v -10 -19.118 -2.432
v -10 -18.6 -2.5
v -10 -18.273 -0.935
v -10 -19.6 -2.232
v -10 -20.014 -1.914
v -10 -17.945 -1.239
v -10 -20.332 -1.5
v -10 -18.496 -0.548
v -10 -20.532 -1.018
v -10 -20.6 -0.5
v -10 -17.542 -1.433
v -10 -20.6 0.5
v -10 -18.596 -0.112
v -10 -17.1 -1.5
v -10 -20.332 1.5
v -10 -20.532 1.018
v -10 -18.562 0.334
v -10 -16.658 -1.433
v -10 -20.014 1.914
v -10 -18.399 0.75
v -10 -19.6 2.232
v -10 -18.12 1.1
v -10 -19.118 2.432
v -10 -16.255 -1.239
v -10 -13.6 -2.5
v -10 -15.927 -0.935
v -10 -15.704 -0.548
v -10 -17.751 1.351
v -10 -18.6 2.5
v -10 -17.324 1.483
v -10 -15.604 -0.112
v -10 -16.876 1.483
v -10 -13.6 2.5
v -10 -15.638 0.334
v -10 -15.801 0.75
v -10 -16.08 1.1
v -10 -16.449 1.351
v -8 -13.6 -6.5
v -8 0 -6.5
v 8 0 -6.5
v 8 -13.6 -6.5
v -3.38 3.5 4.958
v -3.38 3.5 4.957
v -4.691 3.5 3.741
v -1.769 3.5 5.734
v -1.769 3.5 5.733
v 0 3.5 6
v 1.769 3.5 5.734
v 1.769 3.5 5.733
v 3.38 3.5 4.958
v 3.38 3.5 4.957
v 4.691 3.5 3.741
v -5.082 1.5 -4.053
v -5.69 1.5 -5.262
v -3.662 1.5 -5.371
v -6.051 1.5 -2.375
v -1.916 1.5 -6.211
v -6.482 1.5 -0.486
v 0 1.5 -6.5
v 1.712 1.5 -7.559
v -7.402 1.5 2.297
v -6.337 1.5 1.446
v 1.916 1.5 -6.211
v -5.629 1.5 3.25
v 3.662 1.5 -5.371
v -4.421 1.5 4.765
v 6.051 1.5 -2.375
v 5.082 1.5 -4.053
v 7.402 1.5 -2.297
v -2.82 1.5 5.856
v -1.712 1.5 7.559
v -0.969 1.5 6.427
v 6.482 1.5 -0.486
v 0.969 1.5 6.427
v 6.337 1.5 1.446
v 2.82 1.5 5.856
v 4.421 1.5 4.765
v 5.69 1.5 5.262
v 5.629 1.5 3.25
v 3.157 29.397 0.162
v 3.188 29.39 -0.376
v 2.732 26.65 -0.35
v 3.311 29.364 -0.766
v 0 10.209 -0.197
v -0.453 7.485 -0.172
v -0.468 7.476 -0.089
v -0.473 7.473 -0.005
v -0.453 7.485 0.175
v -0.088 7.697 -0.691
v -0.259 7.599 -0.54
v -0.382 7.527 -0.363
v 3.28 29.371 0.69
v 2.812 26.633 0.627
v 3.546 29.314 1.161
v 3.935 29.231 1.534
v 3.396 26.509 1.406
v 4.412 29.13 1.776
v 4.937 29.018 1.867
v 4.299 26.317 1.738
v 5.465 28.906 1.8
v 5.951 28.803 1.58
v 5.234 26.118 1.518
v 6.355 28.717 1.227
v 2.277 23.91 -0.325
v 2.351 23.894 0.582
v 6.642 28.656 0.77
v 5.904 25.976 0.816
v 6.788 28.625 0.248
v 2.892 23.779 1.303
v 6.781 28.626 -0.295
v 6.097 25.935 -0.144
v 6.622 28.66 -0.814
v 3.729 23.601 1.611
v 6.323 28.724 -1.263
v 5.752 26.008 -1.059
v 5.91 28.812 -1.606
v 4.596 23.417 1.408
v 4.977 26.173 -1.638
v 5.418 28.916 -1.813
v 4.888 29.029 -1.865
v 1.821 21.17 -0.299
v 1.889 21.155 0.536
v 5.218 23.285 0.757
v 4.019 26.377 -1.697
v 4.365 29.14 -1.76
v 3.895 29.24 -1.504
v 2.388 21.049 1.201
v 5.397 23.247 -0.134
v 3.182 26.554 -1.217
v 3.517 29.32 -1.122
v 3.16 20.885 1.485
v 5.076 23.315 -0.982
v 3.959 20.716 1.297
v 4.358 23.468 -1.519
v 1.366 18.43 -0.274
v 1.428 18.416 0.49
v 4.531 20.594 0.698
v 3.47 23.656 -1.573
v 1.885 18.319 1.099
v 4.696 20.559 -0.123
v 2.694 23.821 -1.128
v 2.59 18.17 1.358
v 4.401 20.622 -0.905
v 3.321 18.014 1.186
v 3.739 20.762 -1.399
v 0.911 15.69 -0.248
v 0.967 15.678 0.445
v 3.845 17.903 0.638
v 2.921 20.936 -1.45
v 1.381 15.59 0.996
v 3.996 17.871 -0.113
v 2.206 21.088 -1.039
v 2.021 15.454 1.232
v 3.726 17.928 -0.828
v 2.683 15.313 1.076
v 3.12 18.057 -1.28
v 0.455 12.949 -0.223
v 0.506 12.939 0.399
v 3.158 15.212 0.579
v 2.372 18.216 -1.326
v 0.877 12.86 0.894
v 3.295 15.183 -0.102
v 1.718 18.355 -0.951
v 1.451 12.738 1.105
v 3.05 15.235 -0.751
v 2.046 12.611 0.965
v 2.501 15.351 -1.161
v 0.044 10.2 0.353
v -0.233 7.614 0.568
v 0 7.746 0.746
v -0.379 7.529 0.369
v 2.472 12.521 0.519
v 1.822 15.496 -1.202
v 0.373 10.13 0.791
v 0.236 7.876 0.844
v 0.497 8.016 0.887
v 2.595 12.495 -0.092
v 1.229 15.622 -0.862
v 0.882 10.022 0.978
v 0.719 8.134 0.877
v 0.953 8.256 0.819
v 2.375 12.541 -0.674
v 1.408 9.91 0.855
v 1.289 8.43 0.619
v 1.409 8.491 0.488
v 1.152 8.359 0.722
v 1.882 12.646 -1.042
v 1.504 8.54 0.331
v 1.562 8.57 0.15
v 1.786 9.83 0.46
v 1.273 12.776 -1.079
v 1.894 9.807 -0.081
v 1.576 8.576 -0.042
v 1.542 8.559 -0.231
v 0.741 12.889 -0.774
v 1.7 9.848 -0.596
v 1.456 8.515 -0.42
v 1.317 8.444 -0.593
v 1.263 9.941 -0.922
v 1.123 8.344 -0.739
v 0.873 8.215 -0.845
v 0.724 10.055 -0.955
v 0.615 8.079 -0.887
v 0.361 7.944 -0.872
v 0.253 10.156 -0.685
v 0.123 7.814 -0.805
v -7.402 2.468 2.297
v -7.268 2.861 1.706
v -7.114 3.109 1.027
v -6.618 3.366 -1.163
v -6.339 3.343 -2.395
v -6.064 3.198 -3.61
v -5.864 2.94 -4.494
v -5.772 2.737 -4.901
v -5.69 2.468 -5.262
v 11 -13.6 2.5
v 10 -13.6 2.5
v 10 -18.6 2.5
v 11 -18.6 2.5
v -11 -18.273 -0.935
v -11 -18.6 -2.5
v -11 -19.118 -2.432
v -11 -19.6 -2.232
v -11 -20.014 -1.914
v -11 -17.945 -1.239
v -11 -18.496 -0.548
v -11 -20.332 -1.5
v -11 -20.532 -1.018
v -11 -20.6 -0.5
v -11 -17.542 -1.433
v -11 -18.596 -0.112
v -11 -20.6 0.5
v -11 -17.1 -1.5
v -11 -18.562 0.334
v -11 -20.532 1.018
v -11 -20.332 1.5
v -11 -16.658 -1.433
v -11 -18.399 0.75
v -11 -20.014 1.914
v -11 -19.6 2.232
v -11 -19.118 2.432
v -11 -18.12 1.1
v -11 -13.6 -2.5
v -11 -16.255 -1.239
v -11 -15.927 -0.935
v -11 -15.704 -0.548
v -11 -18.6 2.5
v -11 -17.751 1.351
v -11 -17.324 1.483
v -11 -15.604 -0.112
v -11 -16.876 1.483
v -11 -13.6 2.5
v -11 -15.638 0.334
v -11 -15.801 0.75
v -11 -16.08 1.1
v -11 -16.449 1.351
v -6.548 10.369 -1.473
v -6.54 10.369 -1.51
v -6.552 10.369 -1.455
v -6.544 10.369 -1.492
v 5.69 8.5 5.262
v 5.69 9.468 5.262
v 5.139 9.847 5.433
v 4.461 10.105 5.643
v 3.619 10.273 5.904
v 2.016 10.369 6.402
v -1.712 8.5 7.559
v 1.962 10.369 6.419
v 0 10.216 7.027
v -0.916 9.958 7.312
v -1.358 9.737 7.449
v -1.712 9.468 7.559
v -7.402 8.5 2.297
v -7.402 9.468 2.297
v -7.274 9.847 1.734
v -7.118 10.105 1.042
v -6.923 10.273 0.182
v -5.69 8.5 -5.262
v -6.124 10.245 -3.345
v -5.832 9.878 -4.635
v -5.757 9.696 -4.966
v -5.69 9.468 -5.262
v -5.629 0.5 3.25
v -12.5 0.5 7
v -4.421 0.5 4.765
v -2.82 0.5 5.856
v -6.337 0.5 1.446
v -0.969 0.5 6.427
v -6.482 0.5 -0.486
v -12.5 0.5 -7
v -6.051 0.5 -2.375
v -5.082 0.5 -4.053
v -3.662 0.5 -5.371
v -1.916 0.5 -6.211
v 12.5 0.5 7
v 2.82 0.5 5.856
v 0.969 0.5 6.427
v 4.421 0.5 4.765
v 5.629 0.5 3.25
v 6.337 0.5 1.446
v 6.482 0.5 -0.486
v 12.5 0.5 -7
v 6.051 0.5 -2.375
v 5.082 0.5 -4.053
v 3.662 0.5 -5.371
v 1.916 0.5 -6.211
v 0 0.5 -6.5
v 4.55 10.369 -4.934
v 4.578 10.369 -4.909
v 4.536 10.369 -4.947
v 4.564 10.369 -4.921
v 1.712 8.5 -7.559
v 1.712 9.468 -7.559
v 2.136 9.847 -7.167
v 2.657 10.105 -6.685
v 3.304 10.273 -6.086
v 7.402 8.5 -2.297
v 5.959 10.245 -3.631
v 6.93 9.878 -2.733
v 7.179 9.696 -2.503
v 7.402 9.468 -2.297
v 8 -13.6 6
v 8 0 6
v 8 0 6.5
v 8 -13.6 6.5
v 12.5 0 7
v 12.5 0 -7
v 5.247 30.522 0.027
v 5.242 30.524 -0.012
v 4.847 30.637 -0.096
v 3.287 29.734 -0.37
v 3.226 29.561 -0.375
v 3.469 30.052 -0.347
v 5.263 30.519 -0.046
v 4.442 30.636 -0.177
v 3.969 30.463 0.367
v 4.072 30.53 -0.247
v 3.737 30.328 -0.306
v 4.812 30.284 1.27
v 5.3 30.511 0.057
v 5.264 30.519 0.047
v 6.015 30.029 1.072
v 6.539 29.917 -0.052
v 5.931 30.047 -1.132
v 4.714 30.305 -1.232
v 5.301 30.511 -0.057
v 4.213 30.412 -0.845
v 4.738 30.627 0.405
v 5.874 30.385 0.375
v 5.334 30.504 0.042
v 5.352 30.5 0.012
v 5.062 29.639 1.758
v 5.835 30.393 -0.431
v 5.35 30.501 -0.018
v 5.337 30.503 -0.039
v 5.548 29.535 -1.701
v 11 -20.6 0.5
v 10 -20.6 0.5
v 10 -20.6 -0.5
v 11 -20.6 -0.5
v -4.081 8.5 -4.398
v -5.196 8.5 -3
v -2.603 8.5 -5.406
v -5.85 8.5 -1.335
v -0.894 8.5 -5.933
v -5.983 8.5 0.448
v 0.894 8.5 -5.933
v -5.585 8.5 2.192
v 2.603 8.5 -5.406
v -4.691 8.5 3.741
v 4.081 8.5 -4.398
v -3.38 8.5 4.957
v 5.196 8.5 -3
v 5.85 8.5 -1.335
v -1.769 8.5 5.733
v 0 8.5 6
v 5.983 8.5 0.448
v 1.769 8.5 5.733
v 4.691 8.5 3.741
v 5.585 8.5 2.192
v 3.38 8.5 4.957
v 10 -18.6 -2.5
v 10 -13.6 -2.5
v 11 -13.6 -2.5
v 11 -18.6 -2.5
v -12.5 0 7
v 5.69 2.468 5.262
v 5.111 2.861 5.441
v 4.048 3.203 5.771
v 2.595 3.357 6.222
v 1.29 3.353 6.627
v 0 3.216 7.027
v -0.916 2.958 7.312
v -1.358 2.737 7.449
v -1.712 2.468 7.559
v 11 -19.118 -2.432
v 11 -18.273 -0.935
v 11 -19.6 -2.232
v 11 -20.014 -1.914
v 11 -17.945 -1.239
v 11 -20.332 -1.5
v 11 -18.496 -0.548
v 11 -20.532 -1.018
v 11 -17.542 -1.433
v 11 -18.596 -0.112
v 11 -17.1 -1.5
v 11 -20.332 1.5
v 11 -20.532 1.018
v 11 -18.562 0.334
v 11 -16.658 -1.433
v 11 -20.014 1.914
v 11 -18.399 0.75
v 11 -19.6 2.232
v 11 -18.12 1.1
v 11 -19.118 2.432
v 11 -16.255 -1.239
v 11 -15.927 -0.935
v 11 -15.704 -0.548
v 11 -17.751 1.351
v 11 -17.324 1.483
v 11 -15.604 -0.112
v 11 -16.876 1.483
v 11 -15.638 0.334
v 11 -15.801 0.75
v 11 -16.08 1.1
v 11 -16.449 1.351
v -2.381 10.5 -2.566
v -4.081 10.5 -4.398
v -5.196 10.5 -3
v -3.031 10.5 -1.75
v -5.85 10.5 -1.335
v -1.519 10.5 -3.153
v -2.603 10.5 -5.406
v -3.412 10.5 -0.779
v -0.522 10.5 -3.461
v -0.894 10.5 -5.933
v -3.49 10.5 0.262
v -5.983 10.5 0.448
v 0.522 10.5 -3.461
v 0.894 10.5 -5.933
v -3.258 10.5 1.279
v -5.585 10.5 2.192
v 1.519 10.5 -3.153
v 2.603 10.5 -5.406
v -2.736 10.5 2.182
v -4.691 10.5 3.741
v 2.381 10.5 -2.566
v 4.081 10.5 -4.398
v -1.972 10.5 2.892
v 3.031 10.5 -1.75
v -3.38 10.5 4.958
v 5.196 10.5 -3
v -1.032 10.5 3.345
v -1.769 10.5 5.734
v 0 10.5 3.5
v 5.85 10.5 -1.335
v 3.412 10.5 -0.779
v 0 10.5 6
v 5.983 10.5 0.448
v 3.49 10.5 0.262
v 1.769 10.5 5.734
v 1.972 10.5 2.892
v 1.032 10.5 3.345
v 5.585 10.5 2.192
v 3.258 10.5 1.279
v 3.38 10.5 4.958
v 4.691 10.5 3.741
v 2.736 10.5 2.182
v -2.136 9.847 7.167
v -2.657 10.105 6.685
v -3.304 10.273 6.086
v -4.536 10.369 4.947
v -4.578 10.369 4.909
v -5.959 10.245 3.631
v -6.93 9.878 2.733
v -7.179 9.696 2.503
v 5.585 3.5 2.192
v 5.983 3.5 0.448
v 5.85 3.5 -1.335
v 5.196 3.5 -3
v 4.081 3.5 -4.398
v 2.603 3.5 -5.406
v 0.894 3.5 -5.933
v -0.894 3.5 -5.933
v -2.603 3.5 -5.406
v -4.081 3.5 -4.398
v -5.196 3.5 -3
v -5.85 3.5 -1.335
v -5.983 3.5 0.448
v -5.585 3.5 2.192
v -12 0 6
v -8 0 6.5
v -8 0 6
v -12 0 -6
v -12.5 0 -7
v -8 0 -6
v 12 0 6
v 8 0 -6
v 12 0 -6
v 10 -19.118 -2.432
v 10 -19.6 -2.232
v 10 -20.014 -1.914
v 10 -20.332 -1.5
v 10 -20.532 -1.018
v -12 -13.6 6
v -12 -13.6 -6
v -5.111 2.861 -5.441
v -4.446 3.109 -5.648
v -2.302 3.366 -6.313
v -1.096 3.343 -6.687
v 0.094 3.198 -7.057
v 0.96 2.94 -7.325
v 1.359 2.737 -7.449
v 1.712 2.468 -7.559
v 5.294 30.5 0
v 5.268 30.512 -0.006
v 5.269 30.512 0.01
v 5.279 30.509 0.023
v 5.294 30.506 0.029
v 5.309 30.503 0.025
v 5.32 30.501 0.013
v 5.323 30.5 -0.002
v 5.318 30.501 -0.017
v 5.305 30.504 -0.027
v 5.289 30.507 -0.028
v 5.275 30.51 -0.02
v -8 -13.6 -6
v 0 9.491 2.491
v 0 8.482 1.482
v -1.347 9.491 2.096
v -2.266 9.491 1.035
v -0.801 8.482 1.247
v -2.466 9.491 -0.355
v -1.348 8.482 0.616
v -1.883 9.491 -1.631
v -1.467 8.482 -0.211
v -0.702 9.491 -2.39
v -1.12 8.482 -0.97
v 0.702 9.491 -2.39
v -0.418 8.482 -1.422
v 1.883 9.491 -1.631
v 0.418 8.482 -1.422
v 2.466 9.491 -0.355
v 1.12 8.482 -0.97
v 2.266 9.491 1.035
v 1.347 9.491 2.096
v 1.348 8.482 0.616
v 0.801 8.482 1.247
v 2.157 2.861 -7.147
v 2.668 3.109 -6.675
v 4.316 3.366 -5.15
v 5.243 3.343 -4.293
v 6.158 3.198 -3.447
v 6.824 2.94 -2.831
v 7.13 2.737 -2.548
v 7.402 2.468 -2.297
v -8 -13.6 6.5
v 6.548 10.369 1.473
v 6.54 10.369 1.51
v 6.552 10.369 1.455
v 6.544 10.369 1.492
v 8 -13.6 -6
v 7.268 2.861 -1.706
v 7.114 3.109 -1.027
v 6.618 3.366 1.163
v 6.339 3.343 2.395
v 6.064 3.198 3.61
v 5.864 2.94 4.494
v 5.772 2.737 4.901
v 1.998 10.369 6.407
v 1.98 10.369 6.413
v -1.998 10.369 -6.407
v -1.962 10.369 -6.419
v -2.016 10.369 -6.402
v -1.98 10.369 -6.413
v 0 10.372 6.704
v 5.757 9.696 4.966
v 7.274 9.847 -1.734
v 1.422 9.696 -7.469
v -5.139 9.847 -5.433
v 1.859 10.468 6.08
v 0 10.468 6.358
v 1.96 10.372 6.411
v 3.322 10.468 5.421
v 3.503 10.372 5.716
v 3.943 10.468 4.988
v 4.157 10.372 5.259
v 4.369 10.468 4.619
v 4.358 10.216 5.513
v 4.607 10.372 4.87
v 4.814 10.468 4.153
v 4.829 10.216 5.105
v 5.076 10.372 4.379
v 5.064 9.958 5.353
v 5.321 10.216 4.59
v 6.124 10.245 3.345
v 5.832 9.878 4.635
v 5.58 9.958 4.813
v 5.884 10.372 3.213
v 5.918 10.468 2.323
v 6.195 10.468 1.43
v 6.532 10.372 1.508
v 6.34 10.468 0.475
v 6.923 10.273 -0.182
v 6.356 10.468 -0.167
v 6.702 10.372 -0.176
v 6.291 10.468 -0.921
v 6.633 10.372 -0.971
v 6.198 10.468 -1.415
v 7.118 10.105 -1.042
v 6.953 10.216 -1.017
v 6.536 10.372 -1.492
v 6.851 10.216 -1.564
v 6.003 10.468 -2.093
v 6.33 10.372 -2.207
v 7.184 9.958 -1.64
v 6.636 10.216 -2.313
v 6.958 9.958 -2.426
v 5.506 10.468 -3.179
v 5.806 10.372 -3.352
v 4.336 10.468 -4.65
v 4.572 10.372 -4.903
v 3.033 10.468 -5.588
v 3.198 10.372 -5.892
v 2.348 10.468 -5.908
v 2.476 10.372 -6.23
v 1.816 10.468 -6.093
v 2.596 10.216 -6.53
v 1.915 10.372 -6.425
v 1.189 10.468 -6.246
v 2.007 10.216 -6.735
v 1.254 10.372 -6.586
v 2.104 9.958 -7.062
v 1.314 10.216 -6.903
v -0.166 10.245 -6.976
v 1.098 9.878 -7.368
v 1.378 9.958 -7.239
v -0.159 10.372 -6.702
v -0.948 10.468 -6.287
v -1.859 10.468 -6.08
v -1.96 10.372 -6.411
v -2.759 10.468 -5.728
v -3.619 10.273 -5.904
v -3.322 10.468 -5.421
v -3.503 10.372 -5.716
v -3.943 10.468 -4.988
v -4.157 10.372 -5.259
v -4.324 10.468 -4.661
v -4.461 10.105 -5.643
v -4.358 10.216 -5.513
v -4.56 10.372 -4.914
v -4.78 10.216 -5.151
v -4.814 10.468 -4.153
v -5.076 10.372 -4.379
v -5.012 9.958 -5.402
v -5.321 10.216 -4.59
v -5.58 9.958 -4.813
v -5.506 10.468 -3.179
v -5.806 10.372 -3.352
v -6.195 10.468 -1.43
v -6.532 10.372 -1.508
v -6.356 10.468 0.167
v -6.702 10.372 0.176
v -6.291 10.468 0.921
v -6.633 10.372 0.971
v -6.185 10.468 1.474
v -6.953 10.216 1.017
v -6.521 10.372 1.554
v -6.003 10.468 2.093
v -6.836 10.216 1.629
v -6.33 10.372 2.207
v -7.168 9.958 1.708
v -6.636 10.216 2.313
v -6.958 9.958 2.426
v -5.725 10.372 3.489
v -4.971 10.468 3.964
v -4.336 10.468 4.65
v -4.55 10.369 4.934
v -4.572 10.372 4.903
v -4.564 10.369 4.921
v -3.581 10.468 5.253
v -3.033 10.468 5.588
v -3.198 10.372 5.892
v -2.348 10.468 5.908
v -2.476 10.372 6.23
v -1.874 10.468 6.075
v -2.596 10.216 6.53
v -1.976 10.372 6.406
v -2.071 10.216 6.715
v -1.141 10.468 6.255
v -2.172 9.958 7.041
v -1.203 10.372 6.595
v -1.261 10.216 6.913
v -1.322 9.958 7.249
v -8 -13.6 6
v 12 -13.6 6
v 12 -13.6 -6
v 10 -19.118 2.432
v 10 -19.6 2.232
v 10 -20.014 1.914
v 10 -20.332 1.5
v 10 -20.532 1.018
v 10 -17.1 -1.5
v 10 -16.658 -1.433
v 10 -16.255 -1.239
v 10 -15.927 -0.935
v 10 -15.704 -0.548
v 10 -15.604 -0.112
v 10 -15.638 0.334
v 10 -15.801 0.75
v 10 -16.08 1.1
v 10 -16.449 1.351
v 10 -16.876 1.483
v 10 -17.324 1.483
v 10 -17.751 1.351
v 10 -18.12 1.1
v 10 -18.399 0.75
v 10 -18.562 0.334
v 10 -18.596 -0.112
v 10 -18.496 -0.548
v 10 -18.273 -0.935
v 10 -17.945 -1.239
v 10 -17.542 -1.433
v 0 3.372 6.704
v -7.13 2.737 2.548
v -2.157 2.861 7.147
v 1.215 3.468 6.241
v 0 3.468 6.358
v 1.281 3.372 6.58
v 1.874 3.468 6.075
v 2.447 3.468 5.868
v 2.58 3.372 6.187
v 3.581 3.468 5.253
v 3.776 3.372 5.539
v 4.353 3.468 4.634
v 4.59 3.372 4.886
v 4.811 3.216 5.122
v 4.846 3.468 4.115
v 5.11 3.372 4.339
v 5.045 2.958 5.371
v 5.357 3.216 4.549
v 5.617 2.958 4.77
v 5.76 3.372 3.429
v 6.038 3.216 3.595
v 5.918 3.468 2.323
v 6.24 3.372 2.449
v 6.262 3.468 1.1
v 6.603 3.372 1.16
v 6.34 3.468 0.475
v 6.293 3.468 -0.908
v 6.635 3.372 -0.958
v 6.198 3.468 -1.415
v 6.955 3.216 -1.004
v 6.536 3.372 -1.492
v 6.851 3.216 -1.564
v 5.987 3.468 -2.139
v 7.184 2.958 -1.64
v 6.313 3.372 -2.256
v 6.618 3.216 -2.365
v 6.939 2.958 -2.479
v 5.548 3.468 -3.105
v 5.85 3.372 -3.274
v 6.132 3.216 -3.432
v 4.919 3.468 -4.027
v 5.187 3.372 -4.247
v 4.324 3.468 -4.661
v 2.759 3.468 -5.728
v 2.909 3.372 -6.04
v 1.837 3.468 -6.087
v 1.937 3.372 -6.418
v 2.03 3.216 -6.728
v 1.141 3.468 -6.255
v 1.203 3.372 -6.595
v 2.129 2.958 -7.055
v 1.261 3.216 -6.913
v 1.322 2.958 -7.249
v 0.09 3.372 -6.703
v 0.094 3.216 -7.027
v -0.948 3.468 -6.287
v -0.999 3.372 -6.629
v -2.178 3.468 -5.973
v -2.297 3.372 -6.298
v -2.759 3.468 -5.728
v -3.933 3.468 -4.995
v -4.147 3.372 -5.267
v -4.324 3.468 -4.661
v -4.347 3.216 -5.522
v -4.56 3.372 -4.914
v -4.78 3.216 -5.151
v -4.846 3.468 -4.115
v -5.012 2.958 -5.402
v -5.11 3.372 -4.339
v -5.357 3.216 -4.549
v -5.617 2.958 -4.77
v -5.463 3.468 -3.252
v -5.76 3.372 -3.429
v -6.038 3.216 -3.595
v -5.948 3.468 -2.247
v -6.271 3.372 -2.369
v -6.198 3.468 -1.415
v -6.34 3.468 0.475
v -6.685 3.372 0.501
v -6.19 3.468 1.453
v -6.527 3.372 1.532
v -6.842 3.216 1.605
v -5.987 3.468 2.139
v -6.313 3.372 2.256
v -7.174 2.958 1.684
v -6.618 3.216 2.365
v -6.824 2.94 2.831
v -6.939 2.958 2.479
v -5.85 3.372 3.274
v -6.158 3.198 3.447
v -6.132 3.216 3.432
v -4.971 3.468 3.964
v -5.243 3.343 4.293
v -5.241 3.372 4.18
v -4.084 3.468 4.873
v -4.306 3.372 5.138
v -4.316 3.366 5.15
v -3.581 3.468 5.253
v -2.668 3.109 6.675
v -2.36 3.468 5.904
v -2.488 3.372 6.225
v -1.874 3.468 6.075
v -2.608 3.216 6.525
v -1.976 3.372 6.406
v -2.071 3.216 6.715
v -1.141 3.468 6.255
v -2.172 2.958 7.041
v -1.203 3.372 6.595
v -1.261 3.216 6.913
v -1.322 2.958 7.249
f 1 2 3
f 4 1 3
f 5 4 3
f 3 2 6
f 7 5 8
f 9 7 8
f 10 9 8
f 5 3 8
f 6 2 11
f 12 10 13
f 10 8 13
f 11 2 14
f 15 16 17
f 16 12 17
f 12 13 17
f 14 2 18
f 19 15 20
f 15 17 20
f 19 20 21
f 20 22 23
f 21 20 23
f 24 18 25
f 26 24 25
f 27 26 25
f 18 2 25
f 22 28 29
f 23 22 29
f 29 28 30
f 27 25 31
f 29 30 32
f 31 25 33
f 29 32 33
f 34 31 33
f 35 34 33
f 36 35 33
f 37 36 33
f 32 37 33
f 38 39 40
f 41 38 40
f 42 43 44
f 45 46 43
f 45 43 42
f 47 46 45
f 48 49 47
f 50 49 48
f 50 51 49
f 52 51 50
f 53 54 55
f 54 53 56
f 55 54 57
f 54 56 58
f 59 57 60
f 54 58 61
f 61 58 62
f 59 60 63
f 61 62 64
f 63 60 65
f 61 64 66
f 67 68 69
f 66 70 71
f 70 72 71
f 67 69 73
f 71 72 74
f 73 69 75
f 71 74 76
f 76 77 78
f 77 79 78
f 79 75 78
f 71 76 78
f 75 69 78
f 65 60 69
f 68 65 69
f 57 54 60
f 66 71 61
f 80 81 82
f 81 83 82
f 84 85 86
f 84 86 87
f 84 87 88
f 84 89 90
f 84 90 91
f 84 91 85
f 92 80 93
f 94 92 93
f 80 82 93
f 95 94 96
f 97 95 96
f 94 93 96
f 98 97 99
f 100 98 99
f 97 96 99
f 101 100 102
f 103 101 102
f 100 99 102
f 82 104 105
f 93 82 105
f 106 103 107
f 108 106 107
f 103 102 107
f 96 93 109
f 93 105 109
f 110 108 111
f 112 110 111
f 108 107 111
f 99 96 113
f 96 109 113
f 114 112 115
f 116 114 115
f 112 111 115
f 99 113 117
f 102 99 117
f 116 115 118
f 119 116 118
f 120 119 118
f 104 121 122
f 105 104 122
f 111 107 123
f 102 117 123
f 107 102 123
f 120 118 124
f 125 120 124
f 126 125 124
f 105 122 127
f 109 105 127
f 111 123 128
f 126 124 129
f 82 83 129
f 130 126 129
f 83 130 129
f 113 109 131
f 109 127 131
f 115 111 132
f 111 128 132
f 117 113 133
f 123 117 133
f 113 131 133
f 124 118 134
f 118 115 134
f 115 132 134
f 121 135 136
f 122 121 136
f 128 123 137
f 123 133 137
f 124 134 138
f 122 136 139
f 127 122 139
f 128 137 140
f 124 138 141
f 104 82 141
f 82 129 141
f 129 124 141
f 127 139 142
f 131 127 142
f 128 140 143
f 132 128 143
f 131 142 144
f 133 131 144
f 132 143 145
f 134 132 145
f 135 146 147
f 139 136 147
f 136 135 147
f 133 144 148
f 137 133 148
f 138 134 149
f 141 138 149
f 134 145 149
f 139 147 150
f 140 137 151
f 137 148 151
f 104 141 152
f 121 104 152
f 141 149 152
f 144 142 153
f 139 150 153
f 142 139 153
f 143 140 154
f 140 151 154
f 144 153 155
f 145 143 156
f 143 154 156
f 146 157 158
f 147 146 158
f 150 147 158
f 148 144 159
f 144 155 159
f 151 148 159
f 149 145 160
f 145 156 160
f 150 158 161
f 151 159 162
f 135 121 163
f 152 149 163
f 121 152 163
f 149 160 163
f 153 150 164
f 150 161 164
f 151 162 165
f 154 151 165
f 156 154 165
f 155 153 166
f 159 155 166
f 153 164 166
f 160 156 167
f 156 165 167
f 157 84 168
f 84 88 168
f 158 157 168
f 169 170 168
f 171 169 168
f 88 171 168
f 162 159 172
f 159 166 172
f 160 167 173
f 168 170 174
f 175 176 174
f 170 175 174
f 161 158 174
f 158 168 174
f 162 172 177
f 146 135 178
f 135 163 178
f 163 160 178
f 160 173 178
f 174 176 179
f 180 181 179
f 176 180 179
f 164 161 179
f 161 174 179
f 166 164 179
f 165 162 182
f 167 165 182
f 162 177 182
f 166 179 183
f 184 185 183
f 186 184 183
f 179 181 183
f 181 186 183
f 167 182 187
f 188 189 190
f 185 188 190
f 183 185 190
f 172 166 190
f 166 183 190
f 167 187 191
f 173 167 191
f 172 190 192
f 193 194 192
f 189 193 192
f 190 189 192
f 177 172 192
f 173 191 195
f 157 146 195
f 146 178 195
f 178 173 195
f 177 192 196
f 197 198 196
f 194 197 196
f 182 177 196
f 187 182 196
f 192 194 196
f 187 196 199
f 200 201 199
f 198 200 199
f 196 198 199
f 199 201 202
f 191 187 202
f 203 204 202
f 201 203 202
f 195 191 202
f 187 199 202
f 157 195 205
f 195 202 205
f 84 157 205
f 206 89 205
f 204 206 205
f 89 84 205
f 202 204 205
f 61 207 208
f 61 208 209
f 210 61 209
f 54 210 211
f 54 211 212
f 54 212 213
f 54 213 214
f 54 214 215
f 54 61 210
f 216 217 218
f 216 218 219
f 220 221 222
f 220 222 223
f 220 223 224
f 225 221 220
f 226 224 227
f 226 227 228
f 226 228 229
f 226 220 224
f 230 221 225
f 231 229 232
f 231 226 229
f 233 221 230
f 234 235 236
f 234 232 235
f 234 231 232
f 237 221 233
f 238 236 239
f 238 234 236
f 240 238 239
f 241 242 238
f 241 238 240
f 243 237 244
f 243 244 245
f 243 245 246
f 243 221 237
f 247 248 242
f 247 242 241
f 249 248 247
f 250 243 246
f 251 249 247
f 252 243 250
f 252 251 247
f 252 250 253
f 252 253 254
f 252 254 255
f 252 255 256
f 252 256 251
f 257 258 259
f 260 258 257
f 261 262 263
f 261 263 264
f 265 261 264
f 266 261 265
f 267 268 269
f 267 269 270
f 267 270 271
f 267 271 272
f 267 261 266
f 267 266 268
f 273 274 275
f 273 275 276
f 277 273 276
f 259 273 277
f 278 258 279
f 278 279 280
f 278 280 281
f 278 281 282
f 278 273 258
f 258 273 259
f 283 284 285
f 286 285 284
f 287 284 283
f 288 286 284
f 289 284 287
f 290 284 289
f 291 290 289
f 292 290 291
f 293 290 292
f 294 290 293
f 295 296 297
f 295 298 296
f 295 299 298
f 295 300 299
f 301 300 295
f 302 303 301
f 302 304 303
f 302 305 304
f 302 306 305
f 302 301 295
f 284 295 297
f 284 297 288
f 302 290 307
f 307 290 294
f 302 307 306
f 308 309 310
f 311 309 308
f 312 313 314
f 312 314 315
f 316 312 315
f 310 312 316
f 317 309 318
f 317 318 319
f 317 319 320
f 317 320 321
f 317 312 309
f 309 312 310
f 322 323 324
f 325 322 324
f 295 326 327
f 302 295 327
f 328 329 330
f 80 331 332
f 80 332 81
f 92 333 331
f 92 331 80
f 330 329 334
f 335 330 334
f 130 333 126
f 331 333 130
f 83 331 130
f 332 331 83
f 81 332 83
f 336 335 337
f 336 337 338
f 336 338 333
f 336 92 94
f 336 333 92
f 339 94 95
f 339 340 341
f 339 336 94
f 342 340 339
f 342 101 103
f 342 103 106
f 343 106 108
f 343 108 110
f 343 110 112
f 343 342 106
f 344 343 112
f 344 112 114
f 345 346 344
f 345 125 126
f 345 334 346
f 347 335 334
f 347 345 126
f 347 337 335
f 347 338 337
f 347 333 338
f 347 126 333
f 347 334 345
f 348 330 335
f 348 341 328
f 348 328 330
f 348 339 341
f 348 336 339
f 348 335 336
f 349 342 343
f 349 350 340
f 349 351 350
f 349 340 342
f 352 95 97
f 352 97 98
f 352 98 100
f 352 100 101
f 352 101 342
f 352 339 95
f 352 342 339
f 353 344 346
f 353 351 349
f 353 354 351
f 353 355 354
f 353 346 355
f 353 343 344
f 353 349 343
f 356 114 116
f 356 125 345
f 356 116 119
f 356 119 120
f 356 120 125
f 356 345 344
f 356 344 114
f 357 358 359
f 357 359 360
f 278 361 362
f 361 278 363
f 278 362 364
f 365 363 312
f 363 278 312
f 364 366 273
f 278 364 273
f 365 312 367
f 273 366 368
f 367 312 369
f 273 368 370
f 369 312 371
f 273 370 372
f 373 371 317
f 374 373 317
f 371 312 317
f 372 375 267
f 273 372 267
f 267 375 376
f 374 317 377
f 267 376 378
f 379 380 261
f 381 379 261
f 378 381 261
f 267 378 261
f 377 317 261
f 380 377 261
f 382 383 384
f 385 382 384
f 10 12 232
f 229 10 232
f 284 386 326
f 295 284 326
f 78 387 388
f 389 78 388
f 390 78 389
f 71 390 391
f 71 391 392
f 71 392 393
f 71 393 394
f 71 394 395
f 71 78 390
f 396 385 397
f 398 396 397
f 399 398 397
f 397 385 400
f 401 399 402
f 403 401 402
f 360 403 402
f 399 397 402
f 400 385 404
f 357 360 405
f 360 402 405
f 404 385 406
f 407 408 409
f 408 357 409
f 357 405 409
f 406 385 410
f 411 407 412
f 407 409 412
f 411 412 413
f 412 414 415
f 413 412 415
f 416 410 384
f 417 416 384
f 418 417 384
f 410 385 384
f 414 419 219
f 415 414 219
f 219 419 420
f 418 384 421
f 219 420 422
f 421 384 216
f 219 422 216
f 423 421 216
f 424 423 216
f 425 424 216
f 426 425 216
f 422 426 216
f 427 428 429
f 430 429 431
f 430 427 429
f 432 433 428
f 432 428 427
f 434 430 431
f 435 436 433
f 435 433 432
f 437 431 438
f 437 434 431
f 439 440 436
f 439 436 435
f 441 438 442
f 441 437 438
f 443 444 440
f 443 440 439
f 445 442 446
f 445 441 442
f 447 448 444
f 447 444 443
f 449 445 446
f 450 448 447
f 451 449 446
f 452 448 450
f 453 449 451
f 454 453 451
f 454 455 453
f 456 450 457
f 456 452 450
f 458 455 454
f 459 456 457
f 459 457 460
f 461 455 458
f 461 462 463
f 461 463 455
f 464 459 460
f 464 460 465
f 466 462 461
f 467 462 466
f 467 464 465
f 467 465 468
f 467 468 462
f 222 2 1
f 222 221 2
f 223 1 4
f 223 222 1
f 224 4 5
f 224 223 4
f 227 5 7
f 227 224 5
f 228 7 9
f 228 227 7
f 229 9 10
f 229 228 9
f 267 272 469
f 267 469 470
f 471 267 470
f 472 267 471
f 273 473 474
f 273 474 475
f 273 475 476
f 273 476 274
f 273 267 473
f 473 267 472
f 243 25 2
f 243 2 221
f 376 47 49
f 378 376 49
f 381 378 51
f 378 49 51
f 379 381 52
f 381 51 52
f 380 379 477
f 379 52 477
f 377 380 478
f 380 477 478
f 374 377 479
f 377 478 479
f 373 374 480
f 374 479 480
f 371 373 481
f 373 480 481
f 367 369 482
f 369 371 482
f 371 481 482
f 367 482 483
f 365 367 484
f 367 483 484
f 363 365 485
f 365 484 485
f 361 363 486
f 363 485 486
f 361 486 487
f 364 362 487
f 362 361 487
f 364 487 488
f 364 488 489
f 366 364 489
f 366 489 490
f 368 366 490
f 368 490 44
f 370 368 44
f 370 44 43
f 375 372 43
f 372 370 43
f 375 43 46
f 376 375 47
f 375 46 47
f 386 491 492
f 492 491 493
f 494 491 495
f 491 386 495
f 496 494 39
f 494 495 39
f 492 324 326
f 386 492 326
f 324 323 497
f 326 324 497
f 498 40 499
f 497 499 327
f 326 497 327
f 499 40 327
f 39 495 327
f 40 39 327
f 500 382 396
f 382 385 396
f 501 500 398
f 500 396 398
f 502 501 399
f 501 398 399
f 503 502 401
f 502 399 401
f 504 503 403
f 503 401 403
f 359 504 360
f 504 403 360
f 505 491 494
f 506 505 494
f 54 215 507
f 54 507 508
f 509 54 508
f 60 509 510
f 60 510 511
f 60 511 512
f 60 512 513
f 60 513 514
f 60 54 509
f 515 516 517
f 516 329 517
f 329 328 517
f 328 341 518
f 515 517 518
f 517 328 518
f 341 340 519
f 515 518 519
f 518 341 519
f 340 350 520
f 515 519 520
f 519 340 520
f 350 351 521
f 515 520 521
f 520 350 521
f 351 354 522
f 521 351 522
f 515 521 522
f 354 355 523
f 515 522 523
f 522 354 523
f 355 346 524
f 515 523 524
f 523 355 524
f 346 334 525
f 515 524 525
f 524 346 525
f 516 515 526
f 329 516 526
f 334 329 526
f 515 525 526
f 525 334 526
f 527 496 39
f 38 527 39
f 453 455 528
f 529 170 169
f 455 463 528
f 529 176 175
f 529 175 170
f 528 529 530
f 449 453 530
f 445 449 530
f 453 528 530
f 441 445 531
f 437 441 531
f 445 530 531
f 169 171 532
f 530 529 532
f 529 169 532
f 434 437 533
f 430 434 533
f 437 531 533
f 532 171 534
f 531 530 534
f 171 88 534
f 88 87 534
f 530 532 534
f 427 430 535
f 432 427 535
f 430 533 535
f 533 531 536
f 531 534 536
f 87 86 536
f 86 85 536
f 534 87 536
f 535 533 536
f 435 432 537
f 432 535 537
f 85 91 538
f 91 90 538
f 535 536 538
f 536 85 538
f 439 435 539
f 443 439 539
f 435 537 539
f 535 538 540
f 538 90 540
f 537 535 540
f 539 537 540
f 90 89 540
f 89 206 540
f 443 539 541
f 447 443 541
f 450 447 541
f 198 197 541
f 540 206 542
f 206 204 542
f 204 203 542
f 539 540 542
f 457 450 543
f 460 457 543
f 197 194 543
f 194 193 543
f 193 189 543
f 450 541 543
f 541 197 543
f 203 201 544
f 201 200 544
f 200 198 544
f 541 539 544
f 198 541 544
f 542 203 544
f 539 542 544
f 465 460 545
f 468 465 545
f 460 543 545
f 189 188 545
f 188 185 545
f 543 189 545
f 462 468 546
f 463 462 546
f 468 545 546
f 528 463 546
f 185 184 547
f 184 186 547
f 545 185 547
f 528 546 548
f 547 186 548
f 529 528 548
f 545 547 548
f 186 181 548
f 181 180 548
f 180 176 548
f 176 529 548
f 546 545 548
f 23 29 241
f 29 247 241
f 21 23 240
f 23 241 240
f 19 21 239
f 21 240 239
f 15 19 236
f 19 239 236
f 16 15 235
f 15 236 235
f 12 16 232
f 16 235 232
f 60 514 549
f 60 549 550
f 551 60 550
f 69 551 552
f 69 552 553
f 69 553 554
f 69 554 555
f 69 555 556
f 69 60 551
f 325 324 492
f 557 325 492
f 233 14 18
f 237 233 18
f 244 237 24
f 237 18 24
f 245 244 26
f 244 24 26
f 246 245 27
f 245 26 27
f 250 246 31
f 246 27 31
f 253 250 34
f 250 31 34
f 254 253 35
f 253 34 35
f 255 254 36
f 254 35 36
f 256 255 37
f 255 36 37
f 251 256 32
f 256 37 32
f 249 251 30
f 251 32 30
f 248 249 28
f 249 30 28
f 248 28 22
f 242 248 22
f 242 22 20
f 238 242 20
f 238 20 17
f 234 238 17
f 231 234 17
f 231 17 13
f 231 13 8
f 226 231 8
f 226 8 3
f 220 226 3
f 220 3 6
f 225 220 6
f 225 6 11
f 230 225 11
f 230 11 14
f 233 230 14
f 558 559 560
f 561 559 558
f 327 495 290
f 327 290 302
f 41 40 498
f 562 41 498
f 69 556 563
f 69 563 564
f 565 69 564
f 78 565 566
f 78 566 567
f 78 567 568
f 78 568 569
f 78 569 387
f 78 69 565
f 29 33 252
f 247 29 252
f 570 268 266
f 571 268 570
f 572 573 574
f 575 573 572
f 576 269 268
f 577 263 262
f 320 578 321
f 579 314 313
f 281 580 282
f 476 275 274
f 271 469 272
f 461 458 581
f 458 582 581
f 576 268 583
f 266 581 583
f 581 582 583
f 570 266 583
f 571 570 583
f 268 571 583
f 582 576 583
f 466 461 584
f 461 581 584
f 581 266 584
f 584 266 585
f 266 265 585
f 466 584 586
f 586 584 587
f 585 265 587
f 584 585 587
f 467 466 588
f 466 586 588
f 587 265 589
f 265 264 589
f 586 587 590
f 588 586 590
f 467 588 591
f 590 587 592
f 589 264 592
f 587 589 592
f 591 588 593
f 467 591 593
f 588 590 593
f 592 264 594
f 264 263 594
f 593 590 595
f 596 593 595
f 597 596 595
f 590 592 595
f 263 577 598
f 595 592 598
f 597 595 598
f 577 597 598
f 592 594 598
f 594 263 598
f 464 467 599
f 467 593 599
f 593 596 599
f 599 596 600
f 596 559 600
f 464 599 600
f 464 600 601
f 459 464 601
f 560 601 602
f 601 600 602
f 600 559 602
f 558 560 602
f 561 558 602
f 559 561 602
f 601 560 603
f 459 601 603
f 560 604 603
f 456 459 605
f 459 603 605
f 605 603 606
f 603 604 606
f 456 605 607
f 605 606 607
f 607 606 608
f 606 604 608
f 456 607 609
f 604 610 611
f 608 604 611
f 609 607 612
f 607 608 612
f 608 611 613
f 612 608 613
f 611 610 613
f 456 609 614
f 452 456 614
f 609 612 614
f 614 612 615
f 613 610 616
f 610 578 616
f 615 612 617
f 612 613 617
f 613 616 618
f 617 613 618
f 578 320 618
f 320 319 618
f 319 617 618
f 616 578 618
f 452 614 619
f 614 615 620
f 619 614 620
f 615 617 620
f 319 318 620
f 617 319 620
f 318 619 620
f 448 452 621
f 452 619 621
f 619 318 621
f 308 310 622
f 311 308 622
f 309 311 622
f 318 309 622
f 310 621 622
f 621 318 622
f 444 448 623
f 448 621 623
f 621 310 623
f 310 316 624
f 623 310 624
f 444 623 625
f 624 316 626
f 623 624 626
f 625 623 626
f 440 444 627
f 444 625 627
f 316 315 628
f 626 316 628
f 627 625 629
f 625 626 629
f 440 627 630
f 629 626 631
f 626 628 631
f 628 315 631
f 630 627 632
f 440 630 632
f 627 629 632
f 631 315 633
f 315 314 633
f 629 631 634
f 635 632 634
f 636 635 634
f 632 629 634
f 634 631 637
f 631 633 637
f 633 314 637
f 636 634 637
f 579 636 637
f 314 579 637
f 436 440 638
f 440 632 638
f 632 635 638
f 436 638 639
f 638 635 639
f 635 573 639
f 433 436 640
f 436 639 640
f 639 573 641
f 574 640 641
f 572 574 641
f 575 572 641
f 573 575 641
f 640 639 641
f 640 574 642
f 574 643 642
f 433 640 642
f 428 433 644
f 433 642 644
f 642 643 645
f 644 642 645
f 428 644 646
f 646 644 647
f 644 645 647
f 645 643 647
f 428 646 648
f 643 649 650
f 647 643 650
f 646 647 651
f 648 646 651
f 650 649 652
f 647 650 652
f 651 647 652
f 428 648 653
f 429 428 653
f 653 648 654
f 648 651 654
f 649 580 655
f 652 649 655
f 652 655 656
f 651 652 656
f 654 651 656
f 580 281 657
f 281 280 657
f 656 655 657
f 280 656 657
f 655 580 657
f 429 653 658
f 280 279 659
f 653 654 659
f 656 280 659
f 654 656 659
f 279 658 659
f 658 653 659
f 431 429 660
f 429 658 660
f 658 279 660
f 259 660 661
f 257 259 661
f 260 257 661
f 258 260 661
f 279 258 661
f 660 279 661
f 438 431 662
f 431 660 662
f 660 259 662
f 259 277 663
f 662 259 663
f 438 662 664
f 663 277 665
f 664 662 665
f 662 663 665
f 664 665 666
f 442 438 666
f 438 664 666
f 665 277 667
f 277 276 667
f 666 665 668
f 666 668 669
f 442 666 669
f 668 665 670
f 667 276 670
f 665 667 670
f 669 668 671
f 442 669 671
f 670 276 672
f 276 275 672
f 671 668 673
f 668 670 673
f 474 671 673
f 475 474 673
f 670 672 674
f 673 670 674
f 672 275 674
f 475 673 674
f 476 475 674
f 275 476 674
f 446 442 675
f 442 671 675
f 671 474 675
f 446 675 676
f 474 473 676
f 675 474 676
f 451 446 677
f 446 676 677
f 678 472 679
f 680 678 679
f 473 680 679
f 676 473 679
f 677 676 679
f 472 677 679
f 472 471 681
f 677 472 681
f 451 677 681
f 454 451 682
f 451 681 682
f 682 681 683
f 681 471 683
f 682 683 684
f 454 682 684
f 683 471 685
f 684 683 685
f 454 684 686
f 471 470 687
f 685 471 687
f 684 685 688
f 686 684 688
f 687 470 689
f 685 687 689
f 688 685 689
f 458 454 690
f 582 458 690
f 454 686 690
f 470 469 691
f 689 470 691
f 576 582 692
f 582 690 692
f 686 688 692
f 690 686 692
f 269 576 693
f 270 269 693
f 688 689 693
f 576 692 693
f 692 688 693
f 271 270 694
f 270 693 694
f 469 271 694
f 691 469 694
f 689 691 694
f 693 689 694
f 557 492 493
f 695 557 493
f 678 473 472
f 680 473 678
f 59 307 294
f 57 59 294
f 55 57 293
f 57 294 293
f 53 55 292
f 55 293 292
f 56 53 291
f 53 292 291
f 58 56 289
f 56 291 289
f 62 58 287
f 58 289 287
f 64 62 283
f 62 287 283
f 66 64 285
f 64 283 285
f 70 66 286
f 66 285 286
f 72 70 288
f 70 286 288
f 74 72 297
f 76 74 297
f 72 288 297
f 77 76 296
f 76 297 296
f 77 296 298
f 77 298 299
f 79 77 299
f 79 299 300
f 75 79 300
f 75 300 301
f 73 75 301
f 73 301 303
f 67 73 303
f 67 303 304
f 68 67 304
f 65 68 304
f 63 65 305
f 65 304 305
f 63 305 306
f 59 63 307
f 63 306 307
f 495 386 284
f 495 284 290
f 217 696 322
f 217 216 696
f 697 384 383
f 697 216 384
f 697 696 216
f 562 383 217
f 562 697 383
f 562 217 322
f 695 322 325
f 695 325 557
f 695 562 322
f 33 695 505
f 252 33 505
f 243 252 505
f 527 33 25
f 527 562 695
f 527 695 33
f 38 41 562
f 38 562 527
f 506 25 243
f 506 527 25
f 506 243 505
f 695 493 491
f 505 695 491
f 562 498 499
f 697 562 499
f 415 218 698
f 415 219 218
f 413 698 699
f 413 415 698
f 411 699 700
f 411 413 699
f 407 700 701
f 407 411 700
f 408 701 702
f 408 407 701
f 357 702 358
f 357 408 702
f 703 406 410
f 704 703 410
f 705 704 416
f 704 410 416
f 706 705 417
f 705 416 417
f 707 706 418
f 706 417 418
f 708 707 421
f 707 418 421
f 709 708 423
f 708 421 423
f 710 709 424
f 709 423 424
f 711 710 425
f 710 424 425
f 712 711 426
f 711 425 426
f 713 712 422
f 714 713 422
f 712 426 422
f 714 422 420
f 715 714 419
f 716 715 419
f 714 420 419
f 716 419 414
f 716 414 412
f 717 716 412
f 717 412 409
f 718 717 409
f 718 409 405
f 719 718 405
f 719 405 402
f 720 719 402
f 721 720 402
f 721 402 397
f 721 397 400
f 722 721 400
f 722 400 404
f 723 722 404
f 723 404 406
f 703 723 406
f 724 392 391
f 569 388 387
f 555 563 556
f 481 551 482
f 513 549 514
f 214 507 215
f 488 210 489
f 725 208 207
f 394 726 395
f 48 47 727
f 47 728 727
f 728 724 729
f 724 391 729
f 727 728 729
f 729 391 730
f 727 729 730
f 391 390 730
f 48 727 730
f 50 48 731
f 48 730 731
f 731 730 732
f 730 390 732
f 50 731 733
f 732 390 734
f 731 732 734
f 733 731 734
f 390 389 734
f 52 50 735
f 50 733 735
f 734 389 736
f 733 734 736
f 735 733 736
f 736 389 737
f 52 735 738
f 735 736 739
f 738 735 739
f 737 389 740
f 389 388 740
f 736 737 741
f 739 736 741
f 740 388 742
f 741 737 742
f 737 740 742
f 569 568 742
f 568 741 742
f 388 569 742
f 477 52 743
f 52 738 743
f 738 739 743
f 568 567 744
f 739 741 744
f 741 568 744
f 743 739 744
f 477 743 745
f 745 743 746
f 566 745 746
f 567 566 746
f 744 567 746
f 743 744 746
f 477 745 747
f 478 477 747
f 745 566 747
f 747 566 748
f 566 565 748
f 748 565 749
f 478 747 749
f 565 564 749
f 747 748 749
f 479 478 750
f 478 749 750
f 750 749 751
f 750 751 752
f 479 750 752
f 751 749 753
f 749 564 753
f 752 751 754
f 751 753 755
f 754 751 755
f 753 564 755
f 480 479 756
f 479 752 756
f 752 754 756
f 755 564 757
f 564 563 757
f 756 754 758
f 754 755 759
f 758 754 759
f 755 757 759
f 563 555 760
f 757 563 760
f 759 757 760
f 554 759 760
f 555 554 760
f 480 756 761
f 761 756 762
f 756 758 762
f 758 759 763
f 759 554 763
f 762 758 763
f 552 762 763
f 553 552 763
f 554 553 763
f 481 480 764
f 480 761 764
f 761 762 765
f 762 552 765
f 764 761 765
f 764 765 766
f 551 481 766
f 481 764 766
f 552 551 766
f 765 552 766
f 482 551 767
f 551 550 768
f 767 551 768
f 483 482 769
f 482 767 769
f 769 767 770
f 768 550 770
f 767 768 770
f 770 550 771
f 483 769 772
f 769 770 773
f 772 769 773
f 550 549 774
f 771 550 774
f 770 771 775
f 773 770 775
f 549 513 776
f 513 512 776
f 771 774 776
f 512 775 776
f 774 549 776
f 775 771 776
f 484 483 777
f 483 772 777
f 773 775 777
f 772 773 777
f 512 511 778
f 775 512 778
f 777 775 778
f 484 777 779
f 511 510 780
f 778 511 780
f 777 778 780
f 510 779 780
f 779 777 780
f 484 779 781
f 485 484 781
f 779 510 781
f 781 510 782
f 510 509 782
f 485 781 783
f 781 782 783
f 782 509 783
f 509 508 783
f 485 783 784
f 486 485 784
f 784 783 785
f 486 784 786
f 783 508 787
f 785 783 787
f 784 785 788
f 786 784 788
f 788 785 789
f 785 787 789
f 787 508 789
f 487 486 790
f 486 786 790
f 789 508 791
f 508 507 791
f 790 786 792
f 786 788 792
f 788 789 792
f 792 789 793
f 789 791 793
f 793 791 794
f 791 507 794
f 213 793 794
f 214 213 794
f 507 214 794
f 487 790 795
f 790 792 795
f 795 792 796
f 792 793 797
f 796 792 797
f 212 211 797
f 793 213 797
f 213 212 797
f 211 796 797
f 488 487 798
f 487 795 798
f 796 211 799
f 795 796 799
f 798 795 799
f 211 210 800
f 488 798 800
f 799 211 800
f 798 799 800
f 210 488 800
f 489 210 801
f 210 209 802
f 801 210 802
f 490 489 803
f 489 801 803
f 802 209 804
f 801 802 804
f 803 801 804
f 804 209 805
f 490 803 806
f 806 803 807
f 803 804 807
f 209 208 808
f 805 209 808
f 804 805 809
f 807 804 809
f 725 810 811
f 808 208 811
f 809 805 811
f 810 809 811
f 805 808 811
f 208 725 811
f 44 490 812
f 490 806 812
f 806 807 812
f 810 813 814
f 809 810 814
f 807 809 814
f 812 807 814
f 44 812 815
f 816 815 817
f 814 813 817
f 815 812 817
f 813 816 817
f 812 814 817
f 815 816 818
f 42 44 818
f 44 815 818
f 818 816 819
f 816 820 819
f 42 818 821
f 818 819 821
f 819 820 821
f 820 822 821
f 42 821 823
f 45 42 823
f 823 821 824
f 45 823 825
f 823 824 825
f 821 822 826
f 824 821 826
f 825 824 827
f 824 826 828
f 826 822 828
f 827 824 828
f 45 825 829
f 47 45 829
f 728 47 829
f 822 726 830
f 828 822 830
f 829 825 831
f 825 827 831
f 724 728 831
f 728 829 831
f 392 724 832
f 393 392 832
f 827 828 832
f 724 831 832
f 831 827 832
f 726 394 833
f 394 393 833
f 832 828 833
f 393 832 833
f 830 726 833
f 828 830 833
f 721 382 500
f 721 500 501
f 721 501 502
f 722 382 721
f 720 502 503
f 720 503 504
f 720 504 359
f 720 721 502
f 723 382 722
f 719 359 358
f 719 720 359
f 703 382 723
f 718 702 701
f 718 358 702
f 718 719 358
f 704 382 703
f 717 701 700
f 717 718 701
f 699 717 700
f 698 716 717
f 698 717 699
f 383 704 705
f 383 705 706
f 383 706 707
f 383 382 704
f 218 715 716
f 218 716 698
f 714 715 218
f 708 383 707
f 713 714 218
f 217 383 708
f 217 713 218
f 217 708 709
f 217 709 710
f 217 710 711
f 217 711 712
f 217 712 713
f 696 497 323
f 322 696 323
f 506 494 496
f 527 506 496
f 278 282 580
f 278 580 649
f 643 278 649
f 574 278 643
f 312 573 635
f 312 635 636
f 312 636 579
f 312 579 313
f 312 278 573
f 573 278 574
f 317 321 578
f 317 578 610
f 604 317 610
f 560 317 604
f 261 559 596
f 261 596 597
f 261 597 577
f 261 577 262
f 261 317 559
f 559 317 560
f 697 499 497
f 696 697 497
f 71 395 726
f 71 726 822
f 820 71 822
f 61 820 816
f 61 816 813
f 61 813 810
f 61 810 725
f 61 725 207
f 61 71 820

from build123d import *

# Parameters (mm, degrees)
BOSS_EXTRUDE2_DEPTH    = 13.6
SKETCH3_W              = 25
SKETCH3_H              = 14
BOSS_EXTRUDE3_DEPTH    = 0.5
SKETCH4_R              = 6
BOSS_EXTRUDE4_DEPTH    = 10
SKETCH5_R              = 6.5
BOSS_EXTRUDE5_DEPTH    = 1
SKETCH6_R              = 8
BOSS_EXTRUDE6_DEPTH    = 2
BOSS_EXTRUDE7_START    = 5
SKETCH7_R              = 8
BOSS_EXTRUDE7_DEPTH    = 2
FILLET1_R              = 1.5
FILLET2_R              = 2
CUT_EXTRUDE2_START     = -9
CUT_EXTRUDE2_OUTLINE_R = 8
CUT_EXTRUDE2_DEPTH     = 8.869095969
SKETCH13_W             = 1
SKETCH13_H             = 5
BOSS_EXTRUDE8_DEPTH    = 7
SKETCH14_R             = 1.5
CUT_EXTRUDE3_DEPTH     = 40.357608105
FILLET3_R              = 2


# Read off the part's stored shape, not the designer's step: Cut-Extrude2
with BuildPart() as part:
    # Sketch1 → Boss-Extrude2 (new body)
    with BuildSketch(Plane(origin=(0, 0, 0), x_dir=(1, 0, 0), z_dir=(0, 1, 0))):
        Polygon((-12, 6), (-8, 6), (-8, 6.5), (8, 6.5), (8, 6), (12, 6), (12, -6), (8, -6), (8, -6.5), (-8, -6.5), (-8, -6), (-12, -6), align=None)
    extrude(amount=-BOSS_EXTRUDE2_DEPTH)

    # Sketch3 → Boss-Extrude3 (add)
    with BuildSketch(Plane(origin=(0, 0, 0), x_dir=(1, 0, 0), z_dir=(0, 1, 0))):
        Rectangle(SKETCH3_W, SKETCH3_H)
    extrude(amount=BOSS_EXTRUDE3_DEPTH)

    # Sketch4 → Boss-Extrude4 (add)
    with BuildSketch(Plane(origin=(0, 0.5, 0), x_dir=(1, 0, 0), z_dir=(0, 1, 0))):
        with Locations(Location((0, 0, 0), (0, 0, 270))):
            Circle(SKETCH4_R)
    extrude(amount=BOSS_EXTRUDE4_DEPTH)

    # Sketch5 → Boss-Extrude5 (add)
    with BuildSketch(Plane(origin=(0, 0.5, 0), x_dir=(1, 0, 0), z_dir=(0, 1, 0))):
        with Locations(Location((0, 0, 0), (0, 0, 90))):
            Circle(SKETCH5_R)
    extrude(amount=BOSS_EXTRUDE5_DEPTH)

    # Sketch6 → Boss-Extrude6 (add)
    with BuildSketch(Plane(origin=(0, 1.5, 0), x_dir=(1, 0, 0), z_dir=(0, 1, 0))):
        with Locations(Location((0, 0, 0), (0, 0, 270))):
            Circle(SKETCH6_R)
    extrude(amount=BOSS_EXTRUDE6_DEPTH)

    # Sketch7 → Boss-Extrude7 (add)
    with BuildSketch(Plane(origin=(0, 3.5, 0), x_dir=(1, 0, 0), z_dir=(0, 1, 0)).offset(BOSS_EXTRUDE7_START)):
        with Locations(Location((0, 0, 0), (0, 0, 270))):
            Circle(SKETCH7_R)
    extrude(amount=BOSS_EXTRUDE7_DEPTH)

    # Cut-Extrude1 cone 1 section (through the dimple's axis) → Cut-Extrude1 (revolve, cut)
    with BuildSketch(Plane(origin=(0, 10.5, 0), x_dir=(0, 0, 1), z_dir=(1, 0, 0))):
        Polygon((0, 0), (3.5, 0), (0, 3.5), align=None)
    revolve(axis=Axis((0, 10.5, 0), (0, -1, 0)), mode=Mode.SUBTRACT)

    # Sketch8 → Revolve2 (revolve)
    with BuildSketch(Plane.XY, mode=Mode.PRIVATE) as revolve2_sk:
        Polygon((0, 5.593050937), (5.294135454, 30.5), (7.294135454, 30.5), (0.500139858, 4.447468062), align=None)
    revolve(revolve2_sk.sketch.rotate(Axis((0, 5.593050937, 0), (0.2079116908177598, 0.9781476007338056, 0)), 168.394014695), axis=Axis((0, 5.593050937, 0), (0.2079116908177598, 0.9781476007338056, 0)))

    # Fillet1
    fillet1_edges = [part.edges().sort_by_distance(p)[0] for p in [
        (7.255011561, 30.50831604, 0.393567957),
    ]]
    fillet(fillet1_edges, radius=FILLET1_R)

    # Fillet2
    fillet2_edges = [part.edges().sort_by_distance(p)[0] for p in [
        (0, 3.5, -8),
        (0, 10.5, -8),
    ]]
    fillet(fillet2_edges, radius=FILLET2_R - 0.0001)  # a hair under: the kernel refuses the full size

    # Cut-Extrude2 outline → Cut-Extrude2 (cut)
    with BuildSketch(Plane(origin=(0, 10.5, 0), x_dir=(1, 0, 0), z_dir=(0, 1, 0)).offset(CUT_EXTRUDE2_START)):
        Circle(CUT_EXTRUDE2_OUTLINE_R)
        Polygon((-1.711953383, -7.558552481), (-7.401875156, -2.296681121), (-5.689921773, 5.26187136), (1.711953383, 7.558552481), (7.401875156, 2.296681121), (5.689921773, -5.26187136), align=None, mode=Mode.SUBTRACT)
    extrude(amount=CUT_EXTRUDE2_DEPTH, mode=Mode.SUBTRACT)

    # Sketch13 → Boss-Extrude8 (add)
    with BuildSketch(Plane.XZ.offset(13.6)):
        with Locations((10.5, 0)):
            Rectangle(SKETCH13_W, SKETCH13_H)
    boss_extrude8 = extrude(amount=BOSS_EXTRUDE8_DEPTH)

    # Mirror1: Boss-Extrude8 across plane
    add(boss_extrude8.mirror(Plane(origin=(0, 0, 0), x_dir=(0, 0, 1), z_dir=(1, 0, 0))))

    # Sketch14 → Cut-Extrude3 (cut, through all)
    with BuildSketch(Plane(origin=(11, 0, 0), x_dir=(0, 0, -1), z_dir=(1, 0, 0))):
        with Locations((0, -17.1)):
            Circle(SKETCH14_R)
    extrude(amount=-CUT_EXTRUDE3_DEPTH, mode=Mode.SUBTRACT)

    # Fillet3
    fillet3_edges = [part.edges().sort_by_distance(p)[0] for p in [
        (10.5, -20.6, 2.5),
        (10.5, -20.6, -2.5),
        (-10.5, -20.6, -2.5),
        (-10.5, -20.6, 2.5),
    ]]
    fillet(fillet3_edges, radius=FILLET3_R)


solid = part.part
